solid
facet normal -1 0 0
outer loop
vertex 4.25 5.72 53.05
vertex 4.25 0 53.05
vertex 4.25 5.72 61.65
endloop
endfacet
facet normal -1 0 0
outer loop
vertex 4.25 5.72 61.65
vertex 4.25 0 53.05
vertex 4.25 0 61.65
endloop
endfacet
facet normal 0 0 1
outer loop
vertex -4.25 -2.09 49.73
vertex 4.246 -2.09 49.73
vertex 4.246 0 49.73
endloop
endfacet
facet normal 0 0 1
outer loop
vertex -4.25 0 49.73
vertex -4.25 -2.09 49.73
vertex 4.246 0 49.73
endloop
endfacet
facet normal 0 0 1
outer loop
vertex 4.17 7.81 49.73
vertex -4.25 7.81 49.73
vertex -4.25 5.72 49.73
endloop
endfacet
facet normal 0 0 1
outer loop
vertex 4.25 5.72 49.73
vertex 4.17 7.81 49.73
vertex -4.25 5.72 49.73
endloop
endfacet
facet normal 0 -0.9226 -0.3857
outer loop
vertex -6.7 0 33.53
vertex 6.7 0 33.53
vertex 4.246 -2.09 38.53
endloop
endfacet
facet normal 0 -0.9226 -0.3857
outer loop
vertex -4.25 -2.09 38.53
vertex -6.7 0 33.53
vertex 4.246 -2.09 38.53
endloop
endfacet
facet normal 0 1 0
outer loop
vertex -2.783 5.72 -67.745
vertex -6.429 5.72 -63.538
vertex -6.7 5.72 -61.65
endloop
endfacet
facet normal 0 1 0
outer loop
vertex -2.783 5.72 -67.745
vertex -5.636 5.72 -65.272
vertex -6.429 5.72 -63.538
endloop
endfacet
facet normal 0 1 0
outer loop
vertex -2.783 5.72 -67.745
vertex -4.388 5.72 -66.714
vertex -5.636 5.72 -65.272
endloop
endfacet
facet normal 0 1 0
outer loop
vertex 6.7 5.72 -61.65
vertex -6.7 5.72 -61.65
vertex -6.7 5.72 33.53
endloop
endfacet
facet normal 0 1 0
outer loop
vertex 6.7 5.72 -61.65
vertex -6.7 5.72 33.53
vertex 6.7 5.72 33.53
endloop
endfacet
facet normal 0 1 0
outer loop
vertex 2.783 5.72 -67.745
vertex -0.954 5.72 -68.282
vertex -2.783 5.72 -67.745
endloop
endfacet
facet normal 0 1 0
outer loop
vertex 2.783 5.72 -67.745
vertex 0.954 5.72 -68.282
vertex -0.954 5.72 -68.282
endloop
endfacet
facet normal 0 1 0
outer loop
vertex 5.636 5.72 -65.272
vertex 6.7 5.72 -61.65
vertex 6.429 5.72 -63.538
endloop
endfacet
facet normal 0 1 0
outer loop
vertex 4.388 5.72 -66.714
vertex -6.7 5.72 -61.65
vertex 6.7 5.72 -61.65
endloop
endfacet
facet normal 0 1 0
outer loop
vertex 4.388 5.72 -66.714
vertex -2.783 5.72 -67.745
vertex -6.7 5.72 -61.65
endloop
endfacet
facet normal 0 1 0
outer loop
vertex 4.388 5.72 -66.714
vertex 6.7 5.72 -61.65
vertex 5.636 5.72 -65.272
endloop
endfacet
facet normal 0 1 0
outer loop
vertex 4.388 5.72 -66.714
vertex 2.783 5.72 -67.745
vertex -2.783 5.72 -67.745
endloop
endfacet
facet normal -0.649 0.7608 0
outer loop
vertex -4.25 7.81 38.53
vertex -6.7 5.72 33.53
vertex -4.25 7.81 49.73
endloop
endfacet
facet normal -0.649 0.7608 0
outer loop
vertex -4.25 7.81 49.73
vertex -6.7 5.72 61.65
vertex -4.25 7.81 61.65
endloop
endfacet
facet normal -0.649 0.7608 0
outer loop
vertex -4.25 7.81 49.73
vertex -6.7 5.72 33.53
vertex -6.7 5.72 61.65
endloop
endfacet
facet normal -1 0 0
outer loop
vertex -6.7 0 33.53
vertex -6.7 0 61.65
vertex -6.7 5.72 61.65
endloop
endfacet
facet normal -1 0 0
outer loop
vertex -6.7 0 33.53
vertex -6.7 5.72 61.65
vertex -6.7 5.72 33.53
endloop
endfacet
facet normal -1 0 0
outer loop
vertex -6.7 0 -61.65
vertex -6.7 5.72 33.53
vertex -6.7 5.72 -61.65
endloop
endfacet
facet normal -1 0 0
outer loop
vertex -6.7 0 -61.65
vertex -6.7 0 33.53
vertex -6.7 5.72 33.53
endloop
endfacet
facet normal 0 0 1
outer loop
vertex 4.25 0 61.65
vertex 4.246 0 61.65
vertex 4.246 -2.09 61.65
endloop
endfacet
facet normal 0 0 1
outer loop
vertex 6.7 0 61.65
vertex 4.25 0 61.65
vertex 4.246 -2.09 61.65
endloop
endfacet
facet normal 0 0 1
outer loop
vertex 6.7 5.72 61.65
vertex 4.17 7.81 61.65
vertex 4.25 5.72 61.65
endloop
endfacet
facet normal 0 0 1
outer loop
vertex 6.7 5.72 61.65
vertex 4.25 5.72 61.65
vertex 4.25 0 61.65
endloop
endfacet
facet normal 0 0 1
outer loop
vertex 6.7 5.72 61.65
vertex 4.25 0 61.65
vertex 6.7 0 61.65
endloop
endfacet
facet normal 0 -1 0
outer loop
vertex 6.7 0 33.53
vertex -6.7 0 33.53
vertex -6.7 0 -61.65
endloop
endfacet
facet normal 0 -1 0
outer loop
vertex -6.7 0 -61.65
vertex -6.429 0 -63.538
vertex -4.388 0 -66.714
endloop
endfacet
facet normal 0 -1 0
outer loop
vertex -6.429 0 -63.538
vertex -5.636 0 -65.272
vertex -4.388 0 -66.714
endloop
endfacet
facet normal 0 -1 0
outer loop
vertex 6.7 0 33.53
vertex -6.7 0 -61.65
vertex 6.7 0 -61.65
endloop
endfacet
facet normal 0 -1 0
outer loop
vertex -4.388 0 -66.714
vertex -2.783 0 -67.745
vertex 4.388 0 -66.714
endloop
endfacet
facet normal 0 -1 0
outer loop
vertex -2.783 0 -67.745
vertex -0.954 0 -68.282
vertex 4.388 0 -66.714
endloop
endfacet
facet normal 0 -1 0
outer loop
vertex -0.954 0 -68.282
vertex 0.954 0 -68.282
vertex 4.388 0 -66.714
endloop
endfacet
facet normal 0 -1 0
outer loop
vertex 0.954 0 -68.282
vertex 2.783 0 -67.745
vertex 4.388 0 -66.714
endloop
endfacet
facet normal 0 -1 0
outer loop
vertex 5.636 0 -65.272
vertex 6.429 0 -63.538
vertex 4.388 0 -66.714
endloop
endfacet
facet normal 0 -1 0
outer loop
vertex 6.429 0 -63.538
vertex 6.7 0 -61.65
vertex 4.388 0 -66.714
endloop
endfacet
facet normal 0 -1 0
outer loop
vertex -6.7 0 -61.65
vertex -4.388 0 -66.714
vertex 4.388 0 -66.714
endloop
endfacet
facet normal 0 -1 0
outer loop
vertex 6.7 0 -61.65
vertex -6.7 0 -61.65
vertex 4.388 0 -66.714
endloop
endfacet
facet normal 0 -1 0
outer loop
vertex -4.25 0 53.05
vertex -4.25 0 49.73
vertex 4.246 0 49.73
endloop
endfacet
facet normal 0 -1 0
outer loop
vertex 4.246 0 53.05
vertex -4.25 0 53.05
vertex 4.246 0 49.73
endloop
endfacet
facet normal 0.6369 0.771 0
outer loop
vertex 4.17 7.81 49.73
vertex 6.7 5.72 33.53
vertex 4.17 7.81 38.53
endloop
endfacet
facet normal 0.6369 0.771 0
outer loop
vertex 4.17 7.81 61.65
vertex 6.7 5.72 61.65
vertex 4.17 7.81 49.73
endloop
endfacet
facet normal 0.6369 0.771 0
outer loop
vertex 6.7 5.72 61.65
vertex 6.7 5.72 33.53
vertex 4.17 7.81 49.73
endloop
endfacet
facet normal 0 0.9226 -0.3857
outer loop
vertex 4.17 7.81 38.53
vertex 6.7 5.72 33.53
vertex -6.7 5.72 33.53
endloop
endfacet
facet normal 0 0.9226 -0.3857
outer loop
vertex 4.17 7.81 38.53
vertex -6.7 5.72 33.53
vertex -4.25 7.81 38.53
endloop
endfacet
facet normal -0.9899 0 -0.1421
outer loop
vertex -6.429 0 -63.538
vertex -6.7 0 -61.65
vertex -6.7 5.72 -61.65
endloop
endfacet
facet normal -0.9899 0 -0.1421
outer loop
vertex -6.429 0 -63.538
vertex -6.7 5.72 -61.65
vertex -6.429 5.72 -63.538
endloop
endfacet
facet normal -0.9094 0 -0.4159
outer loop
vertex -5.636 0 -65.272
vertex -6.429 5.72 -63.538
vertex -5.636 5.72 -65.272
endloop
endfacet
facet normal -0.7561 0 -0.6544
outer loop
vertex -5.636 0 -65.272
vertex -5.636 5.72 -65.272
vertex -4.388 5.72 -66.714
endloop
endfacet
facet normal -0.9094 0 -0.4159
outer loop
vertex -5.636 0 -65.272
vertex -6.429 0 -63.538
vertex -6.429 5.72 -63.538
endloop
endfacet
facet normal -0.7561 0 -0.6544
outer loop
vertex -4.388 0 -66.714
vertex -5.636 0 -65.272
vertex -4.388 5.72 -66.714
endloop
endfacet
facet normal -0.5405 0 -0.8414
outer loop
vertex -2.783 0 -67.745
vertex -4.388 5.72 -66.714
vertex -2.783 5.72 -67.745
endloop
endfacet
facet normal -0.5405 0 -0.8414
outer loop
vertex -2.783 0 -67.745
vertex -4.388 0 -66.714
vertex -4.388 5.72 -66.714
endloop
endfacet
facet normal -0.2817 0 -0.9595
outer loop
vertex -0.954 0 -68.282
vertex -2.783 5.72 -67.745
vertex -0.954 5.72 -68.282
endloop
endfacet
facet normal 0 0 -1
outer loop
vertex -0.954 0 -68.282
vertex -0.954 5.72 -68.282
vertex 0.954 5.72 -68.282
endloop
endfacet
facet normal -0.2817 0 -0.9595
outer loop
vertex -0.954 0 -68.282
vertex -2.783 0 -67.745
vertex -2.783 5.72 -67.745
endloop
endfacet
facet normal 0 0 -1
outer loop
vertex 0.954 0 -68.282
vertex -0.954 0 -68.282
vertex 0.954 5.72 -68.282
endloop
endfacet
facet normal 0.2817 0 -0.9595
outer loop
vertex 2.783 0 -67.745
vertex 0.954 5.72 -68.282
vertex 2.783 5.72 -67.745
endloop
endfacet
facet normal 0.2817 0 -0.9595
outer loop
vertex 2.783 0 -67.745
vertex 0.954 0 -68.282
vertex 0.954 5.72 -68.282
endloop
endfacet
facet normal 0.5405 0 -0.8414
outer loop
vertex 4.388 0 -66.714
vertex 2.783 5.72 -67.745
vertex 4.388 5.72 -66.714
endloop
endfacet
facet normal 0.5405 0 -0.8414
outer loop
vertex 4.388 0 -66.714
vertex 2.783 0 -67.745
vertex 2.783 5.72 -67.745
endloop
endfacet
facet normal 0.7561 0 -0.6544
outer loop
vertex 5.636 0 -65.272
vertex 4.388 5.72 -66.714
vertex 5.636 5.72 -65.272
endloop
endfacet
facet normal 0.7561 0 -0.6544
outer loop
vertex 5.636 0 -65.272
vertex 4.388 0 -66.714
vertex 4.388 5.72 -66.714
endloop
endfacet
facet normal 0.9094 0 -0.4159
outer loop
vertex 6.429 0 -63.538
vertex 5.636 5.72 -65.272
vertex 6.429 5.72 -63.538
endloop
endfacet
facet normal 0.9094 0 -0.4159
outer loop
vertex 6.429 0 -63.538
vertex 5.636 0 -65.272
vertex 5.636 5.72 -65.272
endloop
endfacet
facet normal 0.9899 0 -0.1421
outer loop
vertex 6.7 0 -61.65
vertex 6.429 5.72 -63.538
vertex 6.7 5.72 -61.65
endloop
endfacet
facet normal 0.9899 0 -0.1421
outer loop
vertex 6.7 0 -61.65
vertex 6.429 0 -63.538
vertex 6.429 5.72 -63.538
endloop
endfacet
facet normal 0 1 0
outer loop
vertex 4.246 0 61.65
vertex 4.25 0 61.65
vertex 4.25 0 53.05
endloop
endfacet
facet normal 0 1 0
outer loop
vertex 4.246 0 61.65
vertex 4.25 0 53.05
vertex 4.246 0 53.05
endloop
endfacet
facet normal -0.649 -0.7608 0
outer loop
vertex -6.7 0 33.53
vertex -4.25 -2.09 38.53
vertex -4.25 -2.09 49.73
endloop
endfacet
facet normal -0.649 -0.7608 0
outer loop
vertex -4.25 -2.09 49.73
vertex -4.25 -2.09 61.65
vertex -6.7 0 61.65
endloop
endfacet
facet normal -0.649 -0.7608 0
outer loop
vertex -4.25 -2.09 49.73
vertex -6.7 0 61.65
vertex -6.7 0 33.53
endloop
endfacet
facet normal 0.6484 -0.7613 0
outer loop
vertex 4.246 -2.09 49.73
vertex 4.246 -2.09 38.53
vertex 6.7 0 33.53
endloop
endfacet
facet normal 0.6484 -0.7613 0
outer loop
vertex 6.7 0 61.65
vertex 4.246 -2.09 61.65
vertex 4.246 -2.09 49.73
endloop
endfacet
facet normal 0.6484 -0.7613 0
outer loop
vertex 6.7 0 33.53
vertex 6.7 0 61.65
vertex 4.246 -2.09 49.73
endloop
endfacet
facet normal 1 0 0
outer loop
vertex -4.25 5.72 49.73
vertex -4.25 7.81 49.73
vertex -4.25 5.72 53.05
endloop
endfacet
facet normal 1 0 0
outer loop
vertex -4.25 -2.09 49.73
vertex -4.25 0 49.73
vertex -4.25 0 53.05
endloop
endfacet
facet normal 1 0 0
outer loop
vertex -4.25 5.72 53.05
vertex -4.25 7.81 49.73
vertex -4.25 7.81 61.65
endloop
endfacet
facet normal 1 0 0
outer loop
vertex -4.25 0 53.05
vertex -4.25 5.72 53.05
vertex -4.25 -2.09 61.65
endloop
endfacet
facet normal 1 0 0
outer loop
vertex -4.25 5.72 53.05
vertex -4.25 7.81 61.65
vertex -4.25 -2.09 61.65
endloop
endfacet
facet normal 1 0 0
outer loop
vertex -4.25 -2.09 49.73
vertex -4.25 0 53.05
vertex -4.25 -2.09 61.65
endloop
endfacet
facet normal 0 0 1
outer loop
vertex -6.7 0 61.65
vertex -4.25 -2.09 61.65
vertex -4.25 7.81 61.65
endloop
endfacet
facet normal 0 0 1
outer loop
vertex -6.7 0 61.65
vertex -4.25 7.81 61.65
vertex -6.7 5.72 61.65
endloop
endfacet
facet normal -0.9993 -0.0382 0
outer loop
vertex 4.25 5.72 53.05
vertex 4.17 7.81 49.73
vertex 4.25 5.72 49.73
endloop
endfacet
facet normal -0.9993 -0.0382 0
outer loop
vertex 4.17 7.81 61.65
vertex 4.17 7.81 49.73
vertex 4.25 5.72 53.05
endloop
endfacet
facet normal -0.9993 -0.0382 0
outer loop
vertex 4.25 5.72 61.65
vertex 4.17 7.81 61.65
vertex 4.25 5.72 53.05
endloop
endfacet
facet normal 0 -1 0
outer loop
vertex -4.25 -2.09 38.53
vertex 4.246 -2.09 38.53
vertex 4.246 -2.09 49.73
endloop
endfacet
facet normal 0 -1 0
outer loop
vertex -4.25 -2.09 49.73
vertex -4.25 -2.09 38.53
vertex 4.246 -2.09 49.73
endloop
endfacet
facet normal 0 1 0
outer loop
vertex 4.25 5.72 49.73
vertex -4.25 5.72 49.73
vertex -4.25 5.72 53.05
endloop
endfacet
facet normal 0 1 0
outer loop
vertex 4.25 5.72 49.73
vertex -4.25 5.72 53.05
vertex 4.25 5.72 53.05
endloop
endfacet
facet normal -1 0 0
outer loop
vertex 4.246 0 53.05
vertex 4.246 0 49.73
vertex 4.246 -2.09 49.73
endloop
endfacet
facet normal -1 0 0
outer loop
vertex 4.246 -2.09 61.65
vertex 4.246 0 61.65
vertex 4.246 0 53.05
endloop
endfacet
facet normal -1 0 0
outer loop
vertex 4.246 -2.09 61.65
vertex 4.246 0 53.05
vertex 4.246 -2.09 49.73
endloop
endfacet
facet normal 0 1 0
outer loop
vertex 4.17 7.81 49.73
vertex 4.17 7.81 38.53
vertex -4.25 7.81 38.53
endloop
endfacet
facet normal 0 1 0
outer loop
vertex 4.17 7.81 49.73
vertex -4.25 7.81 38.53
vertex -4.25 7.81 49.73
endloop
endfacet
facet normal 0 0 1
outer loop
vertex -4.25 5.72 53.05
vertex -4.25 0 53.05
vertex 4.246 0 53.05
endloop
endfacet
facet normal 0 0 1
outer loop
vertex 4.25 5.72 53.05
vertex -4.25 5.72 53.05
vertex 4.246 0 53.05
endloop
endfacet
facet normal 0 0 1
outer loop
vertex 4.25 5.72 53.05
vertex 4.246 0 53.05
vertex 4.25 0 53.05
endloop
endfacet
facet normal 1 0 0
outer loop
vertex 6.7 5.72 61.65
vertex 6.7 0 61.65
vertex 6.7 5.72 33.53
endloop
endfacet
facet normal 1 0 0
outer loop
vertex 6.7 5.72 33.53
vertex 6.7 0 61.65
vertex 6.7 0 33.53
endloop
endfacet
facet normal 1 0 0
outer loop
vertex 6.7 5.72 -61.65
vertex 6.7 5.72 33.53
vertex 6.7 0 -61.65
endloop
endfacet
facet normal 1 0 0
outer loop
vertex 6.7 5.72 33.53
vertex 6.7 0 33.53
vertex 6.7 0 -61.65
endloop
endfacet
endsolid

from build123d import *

# Parameters (mm, degrees)
SKETCH1_W           = 13.4
SKETCH1_H           = 123.3
BOSS_EXTRUDE1_DEPTH = 5.72
BOSS_EXTRUDE2_DEPTH = 13.4
BOSS_EXTRUDE3_DEPTH = 13.4
SKETCH5_W           = 8.5
SKETCH5_H           = 8.6
CUT_EXTRUDE1_DEPTH  = 13.4
BOSS_EXTRUDE4_DEPTH = 11.95
BOSS_EXTRUDE5_DEPTH = 11.95
CUT_EXTRUDE3_DEPTH  = 16.5
BOSS_EXTRUDE6_DEPTH = 11.95
CUT_EXTRUDE6_DEPTH  = 16.6
CUT_EXTRUDE7_DEPTH  = 16.6
BOSS_EXTRUDE7_DEPTH = 11.95
CUT_EXTRUDE8_DEPTH  = 16.6


with BuildPart() as part:
    # Sketch1 → Boss-Extrude1 (new body)
    with BuildSketch(Plane(origin=(0, 0, 0), x_dir=(1, 0, 0), z_dir=(0, 1, 0))):
        Rectangle(SKETCH1_W, SKETCH1_H)
        with BuildLine():
            ThreePointArc((-6.7, 61.65), (0, 68.35), (6.7, 61.65))
            Line((6.7, 61.65), (-6.7, 61.65))
        make_face()
    extrude(amount=BOSS_EXTRUDE1_DEPTH)

    # Sketch3 → Boss-Extrude2 (add)
    with BuildSketch(Plane(origin=(6.7, 0, 0), x_dir=(0, 0, -1), z_dir=(1, 0, 0))):
        Polygon((-49.73, 7.81), (-49.73, 5.72), (-33.53, 5.72), (-38.53, 7.81), align=None)
    extrude(amount=-BOSS_EXTRUDE2_DEPTH)

    # Sketch4 → Boss-Extrude3 (add)
    with BuildSketch(Plane(origin=(6.7, 0, 0), x_dir=(0, 0, -1), z_dir=(1, 0, 0))):
        Polygon((-49.73, 0), (-33.53, 0), (-38.53, -2.09), (-49.73, -2.09), align=None)
    extrude(amount=-BOSS_EXTRUDE3_DEPTH)

    # Sketch5 → Cut-Extrude1 (cut)
    with BuildSketch(Plane.XZ):
        with Locations((0, 57.35)):
            Rectangle(SKETCH5_W, SKETCH5_H)
    extrude(amount=-CUT_EXTRUDE1_DEPTH, mode=Mode.SUBTRACT)

    # Sketch6 → Boss-Extrude4 (add)
    with BuildSketch(Plane.XY.offset(61.65)):
        Polygon((-4.25, 5.72), (-6.7, 5.72), (-4.25, 7.81), align=None)
    extrude(amount=-BOSS_EXTRUDE4_DEPTH)

    # Sketch8 → Boss-Extrude5 (add)
    with BuildSketch(Plane.XY.offset(61.65)):
        Polygon((6.7, 5.72), (4.169608926, 7.81), (4.25, 5.72), align=None)
    extrude(amount=-BOSS_EXTRUDE5_DEPTH)

    # Sketch10 → Cut-Extrude3 (cut)
    with BuildSketch(Plane.XY.offset(49.73)):
        Polygon((-6.7, 7.81), (-6.7, 5.72), (-4.25, 7.81), align=None)
    extrude(amount=-CUT_EXTRUDE3_DEPTH, mode=Mode.SUBTRACT)

    # Sketch11 → Boss-Extrude6 (add)
    with BuildSketch(Plane.XY.offset(61.65)):
        Polygon((4.245506051, 0), (4.245506051, -2.09), (6.7, 0), align=None)
    extrude(amount=-BOSS_EXTRUDE6_DEPTH)

    # Sketch13 → Cut-Extrude6 (cut)
    with BuildSketch(Plane.XY.offset(49.73)):
        Polygon((6.7, 0), (4.245506051, -2.09), (6.7, -2.09), align=None)
    extrude(amount=-CUT_EXTRUDE6_DEPTH, mode=Mode.SUBTRACT)

    # Sketch14 → Cut-Extrude7 (cut)
    with BuildSketch(Plane.XY.offset(49.73)):
        Polygon((4.169608926, 7.81), (6.7, 7.81), (6.7, 5.72), align=None)
    extrude(amount=-CUT_EXTRUDE7_DEPTH, mode=Mode.SUBTRACT)

    # Sketch15 → Boss-Extrude7 (add)
    with BuildSketch(Plane.XY.offset(61.65)):
        Polygon((-4.25, -2.09), (-6.7, 0), (-4.25, 0), align=None)
    extrude(amount=-BOSS_EXTRUDE7_DEPTH)

    # Sketch16 → Cut-Extrude8 (cut)
    with BuildSketch(Plane.XY.offset(49.73)):
        Polygon((-6.7, 0), (-6.7, -2.09), (-4.25, -2.09), align=None)
    extrude(amount=-CUT_EXTRUDE8_DEPTH, mode=Mode.SUBTRACT)


solid = part.part
